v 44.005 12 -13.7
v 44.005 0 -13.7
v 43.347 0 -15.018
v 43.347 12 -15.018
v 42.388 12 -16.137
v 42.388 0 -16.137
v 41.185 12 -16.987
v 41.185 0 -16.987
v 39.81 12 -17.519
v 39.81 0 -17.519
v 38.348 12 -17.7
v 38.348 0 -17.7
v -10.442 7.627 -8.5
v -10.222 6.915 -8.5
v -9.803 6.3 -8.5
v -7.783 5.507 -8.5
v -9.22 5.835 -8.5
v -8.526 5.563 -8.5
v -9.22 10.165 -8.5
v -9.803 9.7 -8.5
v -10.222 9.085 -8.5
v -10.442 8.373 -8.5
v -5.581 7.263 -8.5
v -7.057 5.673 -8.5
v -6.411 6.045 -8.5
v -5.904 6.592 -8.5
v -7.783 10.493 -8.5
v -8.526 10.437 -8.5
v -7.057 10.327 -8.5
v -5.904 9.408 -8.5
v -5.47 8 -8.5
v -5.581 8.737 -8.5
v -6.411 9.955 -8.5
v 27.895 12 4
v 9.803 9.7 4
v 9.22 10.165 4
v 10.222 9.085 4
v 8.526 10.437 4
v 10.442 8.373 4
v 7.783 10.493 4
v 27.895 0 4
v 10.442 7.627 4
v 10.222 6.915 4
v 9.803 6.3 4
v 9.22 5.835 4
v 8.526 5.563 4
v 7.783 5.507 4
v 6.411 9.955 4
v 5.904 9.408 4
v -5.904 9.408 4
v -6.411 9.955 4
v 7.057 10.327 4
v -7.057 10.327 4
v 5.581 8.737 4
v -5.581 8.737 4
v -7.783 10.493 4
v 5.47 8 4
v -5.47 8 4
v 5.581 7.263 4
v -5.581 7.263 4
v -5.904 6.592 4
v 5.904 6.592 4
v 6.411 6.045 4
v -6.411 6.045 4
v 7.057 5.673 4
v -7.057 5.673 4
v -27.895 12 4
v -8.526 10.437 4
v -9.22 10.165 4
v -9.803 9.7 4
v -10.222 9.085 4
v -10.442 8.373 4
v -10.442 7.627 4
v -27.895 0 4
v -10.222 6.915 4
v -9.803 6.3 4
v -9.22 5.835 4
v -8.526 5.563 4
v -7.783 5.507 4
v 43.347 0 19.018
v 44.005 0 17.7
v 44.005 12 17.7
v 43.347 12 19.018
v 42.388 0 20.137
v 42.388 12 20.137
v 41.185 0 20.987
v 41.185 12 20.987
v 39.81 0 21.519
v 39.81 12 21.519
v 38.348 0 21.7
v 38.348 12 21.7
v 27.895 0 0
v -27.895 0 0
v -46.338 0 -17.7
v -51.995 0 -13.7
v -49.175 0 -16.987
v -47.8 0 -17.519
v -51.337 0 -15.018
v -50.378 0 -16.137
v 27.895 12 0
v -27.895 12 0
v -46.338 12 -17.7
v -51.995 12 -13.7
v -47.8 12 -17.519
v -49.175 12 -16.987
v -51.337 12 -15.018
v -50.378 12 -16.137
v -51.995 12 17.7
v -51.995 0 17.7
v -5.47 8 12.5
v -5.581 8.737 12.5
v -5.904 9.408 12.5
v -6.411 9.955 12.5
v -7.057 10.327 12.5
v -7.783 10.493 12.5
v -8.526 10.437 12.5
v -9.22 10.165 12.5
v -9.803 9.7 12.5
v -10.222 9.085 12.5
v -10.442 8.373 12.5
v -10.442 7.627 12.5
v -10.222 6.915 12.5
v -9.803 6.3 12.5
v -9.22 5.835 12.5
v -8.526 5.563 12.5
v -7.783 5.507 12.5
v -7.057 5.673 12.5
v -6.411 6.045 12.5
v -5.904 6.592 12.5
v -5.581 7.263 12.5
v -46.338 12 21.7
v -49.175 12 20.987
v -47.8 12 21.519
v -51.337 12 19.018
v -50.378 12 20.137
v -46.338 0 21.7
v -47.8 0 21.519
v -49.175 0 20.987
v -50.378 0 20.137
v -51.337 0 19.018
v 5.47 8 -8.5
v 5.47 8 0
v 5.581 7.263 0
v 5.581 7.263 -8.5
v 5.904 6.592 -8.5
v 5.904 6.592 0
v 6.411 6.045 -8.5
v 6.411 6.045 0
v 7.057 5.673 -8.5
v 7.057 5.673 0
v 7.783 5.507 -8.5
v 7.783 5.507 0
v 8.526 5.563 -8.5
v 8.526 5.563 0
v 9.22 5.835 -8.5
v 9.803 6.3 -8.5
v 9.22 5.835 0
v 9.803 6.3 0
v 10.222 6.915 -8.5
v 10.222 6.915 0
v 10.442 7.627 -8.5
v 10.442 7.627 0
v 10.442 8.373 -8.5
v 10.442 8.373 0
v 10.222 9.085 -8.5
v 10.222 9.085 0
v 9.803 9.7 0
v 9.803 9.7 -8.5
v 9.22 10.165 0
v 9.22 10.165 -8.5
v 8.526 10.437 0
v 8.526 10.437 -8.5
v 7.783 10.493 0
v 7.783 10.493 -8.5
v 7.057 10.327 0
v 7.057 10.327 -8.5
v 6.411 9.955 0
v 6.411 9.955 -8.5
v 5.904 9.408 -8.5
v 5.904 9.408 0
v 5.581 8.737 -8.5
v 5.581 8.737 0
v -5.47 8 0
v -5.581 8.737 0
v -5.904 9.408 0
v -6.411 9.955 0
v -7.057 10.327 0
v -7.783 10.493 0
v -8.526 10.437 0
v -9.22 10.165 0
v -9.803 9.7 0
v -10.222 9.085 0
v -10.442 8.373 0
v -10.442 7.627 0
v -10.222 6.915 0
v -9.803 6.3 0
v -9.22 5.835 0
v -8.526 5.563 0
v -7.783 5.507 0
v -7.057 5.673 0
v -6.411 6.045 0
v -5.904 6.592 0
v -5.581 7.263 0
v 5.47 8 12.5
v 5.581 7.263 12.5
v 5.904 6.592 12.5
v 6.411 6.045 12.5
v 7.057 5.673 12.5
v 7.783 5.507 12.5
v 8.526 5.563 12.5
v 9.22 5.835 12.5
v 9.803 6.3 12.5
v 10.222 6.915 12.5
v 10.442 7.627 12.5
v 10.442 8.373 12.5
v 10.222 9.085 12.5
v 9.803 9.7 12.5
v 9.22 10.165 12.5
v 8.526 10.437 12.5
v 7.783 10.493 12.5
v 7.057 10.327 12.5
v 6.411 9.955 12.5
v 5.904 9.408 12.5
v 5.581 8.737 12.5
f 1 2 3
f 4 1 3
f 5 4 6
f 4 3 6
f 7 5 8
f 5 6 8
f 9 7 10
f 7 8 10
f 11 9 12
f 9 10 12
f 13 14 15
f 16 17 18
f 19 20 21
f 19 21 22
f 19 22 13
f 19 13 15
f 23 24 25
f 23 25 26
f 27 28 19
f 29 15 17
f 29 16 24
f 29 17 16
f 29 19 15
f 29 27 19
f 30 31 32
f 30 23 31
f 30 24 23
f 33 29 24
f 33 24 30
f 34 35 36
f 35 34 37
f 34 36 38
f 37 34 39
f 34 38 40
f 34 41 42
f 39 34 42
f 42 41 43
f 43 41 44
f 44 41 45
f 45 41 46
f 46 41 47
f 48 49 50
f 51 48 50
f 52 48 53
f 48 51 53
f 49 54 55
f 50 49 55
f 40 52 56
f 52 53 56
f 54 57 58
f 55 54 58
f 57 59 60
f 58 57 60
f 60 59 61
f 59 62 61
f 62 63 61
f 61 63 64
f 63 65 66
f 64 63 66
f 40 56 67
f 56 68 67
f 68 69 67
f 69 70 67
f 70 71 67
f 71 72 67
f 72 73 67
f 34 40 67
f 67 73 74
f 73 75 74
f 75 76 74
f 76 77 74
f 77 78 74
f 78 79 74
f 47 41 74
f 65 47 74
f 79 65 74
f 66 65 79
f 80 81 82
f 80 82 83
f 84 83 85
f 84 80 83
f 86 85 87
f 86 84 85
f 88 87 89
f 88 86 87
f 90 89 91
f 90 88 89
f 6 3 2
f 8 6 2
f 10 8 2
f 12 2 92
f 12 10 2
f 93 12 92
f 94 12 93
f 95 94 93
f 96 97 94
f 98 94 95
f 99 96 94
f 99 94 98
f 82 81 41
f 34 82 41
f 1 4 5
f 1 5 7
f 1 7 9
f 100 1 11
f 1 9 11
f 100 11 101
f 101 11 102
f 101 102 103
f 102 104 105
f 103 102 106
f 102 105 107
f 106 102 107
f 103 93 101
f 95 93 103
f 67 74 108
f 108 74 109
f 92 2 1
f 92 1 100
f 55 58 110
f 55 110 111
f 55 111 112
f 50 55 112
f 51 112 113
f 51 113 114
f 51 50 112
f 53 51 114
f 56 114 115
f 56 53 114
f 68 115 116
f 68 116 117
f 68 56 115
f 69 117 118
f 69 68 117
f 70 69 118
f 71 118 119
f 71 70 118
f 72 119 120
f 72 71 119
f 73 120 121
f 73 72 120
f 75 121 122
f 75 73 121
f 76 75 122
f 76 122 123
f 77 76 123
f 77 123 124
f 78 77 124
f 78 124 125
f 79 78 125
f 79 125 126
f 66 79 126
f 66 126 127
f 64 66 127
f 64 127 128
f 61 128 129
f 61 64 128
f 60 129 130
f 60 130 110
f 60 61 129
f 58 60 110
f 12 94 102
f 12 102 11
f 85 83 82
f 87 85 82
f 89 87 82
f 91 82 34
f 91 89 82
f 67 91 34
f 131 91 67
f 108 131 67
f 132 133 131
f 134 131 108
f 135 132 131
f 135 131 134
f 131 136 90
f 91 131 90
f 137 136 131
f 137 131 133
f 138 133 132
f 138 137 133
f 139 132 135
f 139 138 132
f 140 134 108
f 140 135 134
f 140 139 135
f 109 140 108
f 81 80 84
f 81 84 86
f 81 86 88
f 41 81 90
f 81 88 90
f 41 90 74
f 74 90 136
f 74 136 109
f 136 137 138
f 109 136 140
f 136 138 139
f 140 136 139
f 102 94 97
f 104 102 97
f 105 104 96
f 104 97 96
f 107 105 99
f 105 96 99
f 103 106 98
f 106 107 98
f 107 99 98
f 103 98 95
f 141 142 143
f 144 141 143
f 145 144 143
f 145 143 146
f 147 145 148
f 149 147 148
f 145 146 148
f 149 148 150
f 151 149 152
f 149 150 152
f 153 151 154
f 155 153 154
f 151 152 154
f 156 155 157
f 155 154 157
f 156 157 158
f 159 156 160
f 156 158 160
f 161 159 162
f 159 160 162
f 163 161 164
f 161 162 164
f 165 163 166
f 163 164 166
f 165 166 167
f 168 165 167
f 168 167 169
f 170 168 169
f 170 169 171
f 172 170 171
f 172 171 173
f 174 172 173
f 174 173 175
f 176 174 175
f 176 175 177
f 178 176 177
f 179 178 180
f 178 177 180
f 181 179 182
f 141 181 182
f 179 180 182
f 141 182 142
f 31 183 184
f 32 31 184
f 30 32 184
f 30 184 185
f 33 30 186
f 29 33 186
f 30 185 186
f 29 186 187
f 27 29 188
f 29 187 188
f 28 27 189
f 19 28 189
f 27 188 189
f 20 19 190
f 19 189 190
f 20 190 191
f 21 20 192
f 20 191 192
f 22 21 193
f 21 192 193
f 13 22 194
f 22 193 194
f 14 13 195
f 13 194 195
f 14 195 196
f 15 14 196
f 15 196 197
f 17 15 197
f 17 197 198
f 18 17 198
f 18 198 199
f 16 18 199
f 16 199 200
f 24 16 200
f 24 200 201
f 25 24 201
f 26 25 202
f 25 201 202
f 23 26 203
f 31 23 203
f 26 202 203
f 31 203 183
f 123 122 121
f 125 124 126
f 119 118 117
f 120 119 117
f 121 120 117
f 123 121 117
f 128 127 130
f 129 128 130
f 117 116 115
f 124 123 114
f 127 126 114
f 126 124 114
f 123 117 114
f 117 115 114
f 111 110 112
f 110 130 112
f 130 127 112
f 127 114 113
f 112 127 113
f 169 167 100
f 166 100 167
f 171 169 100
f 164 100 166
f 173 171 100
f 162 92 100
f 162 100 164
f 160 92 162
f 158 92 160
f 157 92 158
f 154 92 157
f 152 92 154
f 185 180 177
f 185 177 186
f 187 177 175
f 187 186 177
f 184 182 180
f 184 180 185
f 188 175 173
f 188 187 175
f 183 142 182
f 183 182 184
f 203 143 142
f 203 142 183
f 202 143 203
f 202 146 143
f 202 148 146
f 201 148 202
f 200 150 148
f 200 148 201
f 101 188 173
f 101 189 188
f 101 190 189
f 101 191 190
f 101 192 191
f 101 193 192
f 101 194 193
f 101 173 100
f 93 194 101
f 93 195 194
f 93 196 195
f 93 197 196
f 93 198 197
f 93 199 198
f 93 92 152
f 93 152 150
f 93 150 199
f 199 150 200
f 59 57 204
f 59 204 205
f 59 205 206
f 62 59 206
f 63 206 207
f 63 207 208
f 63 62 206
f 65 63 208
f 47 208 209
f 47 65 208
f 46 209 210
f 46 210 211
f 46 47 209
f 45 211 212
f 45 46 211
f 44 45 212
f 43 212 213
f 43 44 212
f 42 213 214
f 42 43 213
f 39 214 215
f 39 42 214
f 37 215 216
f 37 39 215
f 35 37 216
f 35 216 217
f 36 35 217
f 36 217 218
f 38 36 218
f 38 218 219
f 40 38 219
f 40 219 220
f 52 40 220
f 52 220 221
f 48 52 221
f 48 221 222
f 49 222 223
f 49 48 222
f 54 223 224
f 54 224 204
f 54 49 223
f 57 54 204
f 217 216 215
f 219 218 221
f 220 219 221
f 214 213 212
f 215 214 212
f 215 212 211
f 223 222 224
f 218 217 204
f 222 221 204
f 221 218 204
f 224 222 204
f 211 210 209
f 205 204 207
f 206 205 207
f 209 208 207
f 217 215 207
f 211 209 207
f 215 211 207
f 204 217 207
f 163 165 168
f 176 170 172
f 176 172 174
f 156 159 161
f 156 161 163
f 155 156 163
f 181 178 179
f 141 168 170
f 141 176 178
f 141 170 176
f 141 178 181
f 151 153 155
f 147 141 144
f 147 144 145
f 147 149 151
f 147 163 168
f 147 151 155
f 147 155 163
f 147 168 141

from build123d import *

# Parameters (mm, degrees)
BOSS_EXTRUDE1_DEPTH = 12
SKETCH3_R           = 2.5
CUT_EXTRUDE1_DEPTH  = 8.5
FILLET1_R           = 6


with BuildPart() as part:
    # Sketch1 → Boss-Extrude1 (new body)
    with BuildSketch(Plane(origin=(0, 0, 0), x_dir=(1, 0, 0), z_dir=(0, 1, 0))):
        Polygon((-51.995, 17.7), (44.005, 17.7), (44.005, 13.7), (27.895, 0), (-27.895, 0), (-51.995, 13.7), align=None)
    extrude(amount=BOSS_EXTRUDE1_DEPTH)

    # Sketch3 → Cut-Extrude1 (cut)
    with BuildSketch(Plane.XY):
        with Locations((-7.97, 8)):
            Circle(SKETCH3_R)
        with Locations(Location((7.97, 8, 0), (0, 0, 180))):
            Circle(SKETCH3_R)
    extrude(amount=-CUT_EXTRUDE1_DEPTH, mode=Mode.SUBTRACT)

    # Fillet1
    # the kernel refuses this fillet: 6 mm, written as the material it takes off along each edge
    with BuildSketch(Plane(origin=(44.005, -14.142135624, -17.7), x_dir=(-1, 0, 0), z_dir=(0, 1, 0))) as fillet1_piece_1:
        with BuildLine():
            CenterArc((5.656854249, 6), FILLET1_R, 199.471220634, 70.528779366)
            Line((0, 4), (-0.113137085, 3.96))
            ThreePointArc((-0.113137085, 3.96), (-0.12, 2), (-0.12, 0))
            Line((-0.12, 0), (0, -0.12))
            Line((0, -0.12), (5.656854249, -0.12))
            Line((5.656854249, -0.12), (5.656854249, 0))
        make_face()
    extrude(amount=40.284271247, mode=Mode.SUBTRACT)
    with BuildSketch(Plane(origin=(-51.995, -14.142135624, -17.7), x_dir=(1, 0, 0), z_dir=(0, 1, 0))) as fillet1_piece_2:
        with BuildLine():
            CenterArc((5.656854249, -6), FILLET1_R, 90, 70.528779366)
            Line((0, -4), (-0.113137085, -3.96))
            ThreePointArc((-0.113137085, -3.96), (-0.12, -2), (-0.12, 0))
            Line((-0.12, 0), (0, 0.12))
            Line((0, 0.12), (5.656854249, 0.12))
            Line((5.656854249, 0.12), (5.656854249, 0))
        make_face()
    extrude(amount=40.284271247, mode=Mode.SUBTRACT)


with BuildPart() as body_2:
    # Mirror1: mirrored copy
    add(part.part.mirror(Plane.XY.offset(2)))


solid = Compound([part.part, body_2.part])
